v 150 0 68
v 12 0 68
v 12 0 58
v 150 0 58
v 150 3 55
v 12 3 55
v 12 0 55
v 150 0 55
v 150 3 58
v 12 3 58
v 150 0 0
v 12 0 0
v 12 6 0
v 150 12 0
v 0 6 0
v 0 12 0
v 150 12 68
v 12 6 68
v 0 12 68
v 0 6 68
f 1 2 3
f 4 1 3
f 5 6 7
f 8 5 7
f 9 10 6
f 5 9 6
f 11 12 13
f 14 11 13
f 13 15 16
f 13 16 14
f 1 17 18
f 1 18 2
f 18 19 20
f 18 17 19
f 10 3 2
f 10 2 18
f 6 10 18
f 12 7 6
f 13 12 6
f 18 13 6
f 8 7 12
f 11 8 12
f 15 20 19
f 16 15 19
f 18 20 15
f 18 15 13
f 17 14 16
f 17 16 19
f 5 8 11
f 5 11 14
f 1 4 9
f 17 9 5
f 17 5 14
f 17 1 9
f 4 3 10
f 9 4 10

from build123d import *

# Parameters (mm, degrees)
F1_DEPTH = 150
F2_W     = 12
F2_H     = 6
F3_DEPTH = 68


with BuildPart() as f1:
    # F0 (on Right) → F1 (new body)
    with BuildSketch(Plane.YZ):
        Polygon((0, 55), (0, 0), (12, 0), (12, 68), (0, 68), (0, 58), (3, 58), (3, 55), align=None)
    extrude(amount=F1_DEPTH)

    # F2 (on Top) → F3 (cut)
    with BuildSketch(Plane.XY):
        with Locations((6, 3)):
            Rectangle(F2_W, F2_H)
    extrude(amount=F3_DEPTH, mode=Mode.SUBTRACT)


solid = f1.part
